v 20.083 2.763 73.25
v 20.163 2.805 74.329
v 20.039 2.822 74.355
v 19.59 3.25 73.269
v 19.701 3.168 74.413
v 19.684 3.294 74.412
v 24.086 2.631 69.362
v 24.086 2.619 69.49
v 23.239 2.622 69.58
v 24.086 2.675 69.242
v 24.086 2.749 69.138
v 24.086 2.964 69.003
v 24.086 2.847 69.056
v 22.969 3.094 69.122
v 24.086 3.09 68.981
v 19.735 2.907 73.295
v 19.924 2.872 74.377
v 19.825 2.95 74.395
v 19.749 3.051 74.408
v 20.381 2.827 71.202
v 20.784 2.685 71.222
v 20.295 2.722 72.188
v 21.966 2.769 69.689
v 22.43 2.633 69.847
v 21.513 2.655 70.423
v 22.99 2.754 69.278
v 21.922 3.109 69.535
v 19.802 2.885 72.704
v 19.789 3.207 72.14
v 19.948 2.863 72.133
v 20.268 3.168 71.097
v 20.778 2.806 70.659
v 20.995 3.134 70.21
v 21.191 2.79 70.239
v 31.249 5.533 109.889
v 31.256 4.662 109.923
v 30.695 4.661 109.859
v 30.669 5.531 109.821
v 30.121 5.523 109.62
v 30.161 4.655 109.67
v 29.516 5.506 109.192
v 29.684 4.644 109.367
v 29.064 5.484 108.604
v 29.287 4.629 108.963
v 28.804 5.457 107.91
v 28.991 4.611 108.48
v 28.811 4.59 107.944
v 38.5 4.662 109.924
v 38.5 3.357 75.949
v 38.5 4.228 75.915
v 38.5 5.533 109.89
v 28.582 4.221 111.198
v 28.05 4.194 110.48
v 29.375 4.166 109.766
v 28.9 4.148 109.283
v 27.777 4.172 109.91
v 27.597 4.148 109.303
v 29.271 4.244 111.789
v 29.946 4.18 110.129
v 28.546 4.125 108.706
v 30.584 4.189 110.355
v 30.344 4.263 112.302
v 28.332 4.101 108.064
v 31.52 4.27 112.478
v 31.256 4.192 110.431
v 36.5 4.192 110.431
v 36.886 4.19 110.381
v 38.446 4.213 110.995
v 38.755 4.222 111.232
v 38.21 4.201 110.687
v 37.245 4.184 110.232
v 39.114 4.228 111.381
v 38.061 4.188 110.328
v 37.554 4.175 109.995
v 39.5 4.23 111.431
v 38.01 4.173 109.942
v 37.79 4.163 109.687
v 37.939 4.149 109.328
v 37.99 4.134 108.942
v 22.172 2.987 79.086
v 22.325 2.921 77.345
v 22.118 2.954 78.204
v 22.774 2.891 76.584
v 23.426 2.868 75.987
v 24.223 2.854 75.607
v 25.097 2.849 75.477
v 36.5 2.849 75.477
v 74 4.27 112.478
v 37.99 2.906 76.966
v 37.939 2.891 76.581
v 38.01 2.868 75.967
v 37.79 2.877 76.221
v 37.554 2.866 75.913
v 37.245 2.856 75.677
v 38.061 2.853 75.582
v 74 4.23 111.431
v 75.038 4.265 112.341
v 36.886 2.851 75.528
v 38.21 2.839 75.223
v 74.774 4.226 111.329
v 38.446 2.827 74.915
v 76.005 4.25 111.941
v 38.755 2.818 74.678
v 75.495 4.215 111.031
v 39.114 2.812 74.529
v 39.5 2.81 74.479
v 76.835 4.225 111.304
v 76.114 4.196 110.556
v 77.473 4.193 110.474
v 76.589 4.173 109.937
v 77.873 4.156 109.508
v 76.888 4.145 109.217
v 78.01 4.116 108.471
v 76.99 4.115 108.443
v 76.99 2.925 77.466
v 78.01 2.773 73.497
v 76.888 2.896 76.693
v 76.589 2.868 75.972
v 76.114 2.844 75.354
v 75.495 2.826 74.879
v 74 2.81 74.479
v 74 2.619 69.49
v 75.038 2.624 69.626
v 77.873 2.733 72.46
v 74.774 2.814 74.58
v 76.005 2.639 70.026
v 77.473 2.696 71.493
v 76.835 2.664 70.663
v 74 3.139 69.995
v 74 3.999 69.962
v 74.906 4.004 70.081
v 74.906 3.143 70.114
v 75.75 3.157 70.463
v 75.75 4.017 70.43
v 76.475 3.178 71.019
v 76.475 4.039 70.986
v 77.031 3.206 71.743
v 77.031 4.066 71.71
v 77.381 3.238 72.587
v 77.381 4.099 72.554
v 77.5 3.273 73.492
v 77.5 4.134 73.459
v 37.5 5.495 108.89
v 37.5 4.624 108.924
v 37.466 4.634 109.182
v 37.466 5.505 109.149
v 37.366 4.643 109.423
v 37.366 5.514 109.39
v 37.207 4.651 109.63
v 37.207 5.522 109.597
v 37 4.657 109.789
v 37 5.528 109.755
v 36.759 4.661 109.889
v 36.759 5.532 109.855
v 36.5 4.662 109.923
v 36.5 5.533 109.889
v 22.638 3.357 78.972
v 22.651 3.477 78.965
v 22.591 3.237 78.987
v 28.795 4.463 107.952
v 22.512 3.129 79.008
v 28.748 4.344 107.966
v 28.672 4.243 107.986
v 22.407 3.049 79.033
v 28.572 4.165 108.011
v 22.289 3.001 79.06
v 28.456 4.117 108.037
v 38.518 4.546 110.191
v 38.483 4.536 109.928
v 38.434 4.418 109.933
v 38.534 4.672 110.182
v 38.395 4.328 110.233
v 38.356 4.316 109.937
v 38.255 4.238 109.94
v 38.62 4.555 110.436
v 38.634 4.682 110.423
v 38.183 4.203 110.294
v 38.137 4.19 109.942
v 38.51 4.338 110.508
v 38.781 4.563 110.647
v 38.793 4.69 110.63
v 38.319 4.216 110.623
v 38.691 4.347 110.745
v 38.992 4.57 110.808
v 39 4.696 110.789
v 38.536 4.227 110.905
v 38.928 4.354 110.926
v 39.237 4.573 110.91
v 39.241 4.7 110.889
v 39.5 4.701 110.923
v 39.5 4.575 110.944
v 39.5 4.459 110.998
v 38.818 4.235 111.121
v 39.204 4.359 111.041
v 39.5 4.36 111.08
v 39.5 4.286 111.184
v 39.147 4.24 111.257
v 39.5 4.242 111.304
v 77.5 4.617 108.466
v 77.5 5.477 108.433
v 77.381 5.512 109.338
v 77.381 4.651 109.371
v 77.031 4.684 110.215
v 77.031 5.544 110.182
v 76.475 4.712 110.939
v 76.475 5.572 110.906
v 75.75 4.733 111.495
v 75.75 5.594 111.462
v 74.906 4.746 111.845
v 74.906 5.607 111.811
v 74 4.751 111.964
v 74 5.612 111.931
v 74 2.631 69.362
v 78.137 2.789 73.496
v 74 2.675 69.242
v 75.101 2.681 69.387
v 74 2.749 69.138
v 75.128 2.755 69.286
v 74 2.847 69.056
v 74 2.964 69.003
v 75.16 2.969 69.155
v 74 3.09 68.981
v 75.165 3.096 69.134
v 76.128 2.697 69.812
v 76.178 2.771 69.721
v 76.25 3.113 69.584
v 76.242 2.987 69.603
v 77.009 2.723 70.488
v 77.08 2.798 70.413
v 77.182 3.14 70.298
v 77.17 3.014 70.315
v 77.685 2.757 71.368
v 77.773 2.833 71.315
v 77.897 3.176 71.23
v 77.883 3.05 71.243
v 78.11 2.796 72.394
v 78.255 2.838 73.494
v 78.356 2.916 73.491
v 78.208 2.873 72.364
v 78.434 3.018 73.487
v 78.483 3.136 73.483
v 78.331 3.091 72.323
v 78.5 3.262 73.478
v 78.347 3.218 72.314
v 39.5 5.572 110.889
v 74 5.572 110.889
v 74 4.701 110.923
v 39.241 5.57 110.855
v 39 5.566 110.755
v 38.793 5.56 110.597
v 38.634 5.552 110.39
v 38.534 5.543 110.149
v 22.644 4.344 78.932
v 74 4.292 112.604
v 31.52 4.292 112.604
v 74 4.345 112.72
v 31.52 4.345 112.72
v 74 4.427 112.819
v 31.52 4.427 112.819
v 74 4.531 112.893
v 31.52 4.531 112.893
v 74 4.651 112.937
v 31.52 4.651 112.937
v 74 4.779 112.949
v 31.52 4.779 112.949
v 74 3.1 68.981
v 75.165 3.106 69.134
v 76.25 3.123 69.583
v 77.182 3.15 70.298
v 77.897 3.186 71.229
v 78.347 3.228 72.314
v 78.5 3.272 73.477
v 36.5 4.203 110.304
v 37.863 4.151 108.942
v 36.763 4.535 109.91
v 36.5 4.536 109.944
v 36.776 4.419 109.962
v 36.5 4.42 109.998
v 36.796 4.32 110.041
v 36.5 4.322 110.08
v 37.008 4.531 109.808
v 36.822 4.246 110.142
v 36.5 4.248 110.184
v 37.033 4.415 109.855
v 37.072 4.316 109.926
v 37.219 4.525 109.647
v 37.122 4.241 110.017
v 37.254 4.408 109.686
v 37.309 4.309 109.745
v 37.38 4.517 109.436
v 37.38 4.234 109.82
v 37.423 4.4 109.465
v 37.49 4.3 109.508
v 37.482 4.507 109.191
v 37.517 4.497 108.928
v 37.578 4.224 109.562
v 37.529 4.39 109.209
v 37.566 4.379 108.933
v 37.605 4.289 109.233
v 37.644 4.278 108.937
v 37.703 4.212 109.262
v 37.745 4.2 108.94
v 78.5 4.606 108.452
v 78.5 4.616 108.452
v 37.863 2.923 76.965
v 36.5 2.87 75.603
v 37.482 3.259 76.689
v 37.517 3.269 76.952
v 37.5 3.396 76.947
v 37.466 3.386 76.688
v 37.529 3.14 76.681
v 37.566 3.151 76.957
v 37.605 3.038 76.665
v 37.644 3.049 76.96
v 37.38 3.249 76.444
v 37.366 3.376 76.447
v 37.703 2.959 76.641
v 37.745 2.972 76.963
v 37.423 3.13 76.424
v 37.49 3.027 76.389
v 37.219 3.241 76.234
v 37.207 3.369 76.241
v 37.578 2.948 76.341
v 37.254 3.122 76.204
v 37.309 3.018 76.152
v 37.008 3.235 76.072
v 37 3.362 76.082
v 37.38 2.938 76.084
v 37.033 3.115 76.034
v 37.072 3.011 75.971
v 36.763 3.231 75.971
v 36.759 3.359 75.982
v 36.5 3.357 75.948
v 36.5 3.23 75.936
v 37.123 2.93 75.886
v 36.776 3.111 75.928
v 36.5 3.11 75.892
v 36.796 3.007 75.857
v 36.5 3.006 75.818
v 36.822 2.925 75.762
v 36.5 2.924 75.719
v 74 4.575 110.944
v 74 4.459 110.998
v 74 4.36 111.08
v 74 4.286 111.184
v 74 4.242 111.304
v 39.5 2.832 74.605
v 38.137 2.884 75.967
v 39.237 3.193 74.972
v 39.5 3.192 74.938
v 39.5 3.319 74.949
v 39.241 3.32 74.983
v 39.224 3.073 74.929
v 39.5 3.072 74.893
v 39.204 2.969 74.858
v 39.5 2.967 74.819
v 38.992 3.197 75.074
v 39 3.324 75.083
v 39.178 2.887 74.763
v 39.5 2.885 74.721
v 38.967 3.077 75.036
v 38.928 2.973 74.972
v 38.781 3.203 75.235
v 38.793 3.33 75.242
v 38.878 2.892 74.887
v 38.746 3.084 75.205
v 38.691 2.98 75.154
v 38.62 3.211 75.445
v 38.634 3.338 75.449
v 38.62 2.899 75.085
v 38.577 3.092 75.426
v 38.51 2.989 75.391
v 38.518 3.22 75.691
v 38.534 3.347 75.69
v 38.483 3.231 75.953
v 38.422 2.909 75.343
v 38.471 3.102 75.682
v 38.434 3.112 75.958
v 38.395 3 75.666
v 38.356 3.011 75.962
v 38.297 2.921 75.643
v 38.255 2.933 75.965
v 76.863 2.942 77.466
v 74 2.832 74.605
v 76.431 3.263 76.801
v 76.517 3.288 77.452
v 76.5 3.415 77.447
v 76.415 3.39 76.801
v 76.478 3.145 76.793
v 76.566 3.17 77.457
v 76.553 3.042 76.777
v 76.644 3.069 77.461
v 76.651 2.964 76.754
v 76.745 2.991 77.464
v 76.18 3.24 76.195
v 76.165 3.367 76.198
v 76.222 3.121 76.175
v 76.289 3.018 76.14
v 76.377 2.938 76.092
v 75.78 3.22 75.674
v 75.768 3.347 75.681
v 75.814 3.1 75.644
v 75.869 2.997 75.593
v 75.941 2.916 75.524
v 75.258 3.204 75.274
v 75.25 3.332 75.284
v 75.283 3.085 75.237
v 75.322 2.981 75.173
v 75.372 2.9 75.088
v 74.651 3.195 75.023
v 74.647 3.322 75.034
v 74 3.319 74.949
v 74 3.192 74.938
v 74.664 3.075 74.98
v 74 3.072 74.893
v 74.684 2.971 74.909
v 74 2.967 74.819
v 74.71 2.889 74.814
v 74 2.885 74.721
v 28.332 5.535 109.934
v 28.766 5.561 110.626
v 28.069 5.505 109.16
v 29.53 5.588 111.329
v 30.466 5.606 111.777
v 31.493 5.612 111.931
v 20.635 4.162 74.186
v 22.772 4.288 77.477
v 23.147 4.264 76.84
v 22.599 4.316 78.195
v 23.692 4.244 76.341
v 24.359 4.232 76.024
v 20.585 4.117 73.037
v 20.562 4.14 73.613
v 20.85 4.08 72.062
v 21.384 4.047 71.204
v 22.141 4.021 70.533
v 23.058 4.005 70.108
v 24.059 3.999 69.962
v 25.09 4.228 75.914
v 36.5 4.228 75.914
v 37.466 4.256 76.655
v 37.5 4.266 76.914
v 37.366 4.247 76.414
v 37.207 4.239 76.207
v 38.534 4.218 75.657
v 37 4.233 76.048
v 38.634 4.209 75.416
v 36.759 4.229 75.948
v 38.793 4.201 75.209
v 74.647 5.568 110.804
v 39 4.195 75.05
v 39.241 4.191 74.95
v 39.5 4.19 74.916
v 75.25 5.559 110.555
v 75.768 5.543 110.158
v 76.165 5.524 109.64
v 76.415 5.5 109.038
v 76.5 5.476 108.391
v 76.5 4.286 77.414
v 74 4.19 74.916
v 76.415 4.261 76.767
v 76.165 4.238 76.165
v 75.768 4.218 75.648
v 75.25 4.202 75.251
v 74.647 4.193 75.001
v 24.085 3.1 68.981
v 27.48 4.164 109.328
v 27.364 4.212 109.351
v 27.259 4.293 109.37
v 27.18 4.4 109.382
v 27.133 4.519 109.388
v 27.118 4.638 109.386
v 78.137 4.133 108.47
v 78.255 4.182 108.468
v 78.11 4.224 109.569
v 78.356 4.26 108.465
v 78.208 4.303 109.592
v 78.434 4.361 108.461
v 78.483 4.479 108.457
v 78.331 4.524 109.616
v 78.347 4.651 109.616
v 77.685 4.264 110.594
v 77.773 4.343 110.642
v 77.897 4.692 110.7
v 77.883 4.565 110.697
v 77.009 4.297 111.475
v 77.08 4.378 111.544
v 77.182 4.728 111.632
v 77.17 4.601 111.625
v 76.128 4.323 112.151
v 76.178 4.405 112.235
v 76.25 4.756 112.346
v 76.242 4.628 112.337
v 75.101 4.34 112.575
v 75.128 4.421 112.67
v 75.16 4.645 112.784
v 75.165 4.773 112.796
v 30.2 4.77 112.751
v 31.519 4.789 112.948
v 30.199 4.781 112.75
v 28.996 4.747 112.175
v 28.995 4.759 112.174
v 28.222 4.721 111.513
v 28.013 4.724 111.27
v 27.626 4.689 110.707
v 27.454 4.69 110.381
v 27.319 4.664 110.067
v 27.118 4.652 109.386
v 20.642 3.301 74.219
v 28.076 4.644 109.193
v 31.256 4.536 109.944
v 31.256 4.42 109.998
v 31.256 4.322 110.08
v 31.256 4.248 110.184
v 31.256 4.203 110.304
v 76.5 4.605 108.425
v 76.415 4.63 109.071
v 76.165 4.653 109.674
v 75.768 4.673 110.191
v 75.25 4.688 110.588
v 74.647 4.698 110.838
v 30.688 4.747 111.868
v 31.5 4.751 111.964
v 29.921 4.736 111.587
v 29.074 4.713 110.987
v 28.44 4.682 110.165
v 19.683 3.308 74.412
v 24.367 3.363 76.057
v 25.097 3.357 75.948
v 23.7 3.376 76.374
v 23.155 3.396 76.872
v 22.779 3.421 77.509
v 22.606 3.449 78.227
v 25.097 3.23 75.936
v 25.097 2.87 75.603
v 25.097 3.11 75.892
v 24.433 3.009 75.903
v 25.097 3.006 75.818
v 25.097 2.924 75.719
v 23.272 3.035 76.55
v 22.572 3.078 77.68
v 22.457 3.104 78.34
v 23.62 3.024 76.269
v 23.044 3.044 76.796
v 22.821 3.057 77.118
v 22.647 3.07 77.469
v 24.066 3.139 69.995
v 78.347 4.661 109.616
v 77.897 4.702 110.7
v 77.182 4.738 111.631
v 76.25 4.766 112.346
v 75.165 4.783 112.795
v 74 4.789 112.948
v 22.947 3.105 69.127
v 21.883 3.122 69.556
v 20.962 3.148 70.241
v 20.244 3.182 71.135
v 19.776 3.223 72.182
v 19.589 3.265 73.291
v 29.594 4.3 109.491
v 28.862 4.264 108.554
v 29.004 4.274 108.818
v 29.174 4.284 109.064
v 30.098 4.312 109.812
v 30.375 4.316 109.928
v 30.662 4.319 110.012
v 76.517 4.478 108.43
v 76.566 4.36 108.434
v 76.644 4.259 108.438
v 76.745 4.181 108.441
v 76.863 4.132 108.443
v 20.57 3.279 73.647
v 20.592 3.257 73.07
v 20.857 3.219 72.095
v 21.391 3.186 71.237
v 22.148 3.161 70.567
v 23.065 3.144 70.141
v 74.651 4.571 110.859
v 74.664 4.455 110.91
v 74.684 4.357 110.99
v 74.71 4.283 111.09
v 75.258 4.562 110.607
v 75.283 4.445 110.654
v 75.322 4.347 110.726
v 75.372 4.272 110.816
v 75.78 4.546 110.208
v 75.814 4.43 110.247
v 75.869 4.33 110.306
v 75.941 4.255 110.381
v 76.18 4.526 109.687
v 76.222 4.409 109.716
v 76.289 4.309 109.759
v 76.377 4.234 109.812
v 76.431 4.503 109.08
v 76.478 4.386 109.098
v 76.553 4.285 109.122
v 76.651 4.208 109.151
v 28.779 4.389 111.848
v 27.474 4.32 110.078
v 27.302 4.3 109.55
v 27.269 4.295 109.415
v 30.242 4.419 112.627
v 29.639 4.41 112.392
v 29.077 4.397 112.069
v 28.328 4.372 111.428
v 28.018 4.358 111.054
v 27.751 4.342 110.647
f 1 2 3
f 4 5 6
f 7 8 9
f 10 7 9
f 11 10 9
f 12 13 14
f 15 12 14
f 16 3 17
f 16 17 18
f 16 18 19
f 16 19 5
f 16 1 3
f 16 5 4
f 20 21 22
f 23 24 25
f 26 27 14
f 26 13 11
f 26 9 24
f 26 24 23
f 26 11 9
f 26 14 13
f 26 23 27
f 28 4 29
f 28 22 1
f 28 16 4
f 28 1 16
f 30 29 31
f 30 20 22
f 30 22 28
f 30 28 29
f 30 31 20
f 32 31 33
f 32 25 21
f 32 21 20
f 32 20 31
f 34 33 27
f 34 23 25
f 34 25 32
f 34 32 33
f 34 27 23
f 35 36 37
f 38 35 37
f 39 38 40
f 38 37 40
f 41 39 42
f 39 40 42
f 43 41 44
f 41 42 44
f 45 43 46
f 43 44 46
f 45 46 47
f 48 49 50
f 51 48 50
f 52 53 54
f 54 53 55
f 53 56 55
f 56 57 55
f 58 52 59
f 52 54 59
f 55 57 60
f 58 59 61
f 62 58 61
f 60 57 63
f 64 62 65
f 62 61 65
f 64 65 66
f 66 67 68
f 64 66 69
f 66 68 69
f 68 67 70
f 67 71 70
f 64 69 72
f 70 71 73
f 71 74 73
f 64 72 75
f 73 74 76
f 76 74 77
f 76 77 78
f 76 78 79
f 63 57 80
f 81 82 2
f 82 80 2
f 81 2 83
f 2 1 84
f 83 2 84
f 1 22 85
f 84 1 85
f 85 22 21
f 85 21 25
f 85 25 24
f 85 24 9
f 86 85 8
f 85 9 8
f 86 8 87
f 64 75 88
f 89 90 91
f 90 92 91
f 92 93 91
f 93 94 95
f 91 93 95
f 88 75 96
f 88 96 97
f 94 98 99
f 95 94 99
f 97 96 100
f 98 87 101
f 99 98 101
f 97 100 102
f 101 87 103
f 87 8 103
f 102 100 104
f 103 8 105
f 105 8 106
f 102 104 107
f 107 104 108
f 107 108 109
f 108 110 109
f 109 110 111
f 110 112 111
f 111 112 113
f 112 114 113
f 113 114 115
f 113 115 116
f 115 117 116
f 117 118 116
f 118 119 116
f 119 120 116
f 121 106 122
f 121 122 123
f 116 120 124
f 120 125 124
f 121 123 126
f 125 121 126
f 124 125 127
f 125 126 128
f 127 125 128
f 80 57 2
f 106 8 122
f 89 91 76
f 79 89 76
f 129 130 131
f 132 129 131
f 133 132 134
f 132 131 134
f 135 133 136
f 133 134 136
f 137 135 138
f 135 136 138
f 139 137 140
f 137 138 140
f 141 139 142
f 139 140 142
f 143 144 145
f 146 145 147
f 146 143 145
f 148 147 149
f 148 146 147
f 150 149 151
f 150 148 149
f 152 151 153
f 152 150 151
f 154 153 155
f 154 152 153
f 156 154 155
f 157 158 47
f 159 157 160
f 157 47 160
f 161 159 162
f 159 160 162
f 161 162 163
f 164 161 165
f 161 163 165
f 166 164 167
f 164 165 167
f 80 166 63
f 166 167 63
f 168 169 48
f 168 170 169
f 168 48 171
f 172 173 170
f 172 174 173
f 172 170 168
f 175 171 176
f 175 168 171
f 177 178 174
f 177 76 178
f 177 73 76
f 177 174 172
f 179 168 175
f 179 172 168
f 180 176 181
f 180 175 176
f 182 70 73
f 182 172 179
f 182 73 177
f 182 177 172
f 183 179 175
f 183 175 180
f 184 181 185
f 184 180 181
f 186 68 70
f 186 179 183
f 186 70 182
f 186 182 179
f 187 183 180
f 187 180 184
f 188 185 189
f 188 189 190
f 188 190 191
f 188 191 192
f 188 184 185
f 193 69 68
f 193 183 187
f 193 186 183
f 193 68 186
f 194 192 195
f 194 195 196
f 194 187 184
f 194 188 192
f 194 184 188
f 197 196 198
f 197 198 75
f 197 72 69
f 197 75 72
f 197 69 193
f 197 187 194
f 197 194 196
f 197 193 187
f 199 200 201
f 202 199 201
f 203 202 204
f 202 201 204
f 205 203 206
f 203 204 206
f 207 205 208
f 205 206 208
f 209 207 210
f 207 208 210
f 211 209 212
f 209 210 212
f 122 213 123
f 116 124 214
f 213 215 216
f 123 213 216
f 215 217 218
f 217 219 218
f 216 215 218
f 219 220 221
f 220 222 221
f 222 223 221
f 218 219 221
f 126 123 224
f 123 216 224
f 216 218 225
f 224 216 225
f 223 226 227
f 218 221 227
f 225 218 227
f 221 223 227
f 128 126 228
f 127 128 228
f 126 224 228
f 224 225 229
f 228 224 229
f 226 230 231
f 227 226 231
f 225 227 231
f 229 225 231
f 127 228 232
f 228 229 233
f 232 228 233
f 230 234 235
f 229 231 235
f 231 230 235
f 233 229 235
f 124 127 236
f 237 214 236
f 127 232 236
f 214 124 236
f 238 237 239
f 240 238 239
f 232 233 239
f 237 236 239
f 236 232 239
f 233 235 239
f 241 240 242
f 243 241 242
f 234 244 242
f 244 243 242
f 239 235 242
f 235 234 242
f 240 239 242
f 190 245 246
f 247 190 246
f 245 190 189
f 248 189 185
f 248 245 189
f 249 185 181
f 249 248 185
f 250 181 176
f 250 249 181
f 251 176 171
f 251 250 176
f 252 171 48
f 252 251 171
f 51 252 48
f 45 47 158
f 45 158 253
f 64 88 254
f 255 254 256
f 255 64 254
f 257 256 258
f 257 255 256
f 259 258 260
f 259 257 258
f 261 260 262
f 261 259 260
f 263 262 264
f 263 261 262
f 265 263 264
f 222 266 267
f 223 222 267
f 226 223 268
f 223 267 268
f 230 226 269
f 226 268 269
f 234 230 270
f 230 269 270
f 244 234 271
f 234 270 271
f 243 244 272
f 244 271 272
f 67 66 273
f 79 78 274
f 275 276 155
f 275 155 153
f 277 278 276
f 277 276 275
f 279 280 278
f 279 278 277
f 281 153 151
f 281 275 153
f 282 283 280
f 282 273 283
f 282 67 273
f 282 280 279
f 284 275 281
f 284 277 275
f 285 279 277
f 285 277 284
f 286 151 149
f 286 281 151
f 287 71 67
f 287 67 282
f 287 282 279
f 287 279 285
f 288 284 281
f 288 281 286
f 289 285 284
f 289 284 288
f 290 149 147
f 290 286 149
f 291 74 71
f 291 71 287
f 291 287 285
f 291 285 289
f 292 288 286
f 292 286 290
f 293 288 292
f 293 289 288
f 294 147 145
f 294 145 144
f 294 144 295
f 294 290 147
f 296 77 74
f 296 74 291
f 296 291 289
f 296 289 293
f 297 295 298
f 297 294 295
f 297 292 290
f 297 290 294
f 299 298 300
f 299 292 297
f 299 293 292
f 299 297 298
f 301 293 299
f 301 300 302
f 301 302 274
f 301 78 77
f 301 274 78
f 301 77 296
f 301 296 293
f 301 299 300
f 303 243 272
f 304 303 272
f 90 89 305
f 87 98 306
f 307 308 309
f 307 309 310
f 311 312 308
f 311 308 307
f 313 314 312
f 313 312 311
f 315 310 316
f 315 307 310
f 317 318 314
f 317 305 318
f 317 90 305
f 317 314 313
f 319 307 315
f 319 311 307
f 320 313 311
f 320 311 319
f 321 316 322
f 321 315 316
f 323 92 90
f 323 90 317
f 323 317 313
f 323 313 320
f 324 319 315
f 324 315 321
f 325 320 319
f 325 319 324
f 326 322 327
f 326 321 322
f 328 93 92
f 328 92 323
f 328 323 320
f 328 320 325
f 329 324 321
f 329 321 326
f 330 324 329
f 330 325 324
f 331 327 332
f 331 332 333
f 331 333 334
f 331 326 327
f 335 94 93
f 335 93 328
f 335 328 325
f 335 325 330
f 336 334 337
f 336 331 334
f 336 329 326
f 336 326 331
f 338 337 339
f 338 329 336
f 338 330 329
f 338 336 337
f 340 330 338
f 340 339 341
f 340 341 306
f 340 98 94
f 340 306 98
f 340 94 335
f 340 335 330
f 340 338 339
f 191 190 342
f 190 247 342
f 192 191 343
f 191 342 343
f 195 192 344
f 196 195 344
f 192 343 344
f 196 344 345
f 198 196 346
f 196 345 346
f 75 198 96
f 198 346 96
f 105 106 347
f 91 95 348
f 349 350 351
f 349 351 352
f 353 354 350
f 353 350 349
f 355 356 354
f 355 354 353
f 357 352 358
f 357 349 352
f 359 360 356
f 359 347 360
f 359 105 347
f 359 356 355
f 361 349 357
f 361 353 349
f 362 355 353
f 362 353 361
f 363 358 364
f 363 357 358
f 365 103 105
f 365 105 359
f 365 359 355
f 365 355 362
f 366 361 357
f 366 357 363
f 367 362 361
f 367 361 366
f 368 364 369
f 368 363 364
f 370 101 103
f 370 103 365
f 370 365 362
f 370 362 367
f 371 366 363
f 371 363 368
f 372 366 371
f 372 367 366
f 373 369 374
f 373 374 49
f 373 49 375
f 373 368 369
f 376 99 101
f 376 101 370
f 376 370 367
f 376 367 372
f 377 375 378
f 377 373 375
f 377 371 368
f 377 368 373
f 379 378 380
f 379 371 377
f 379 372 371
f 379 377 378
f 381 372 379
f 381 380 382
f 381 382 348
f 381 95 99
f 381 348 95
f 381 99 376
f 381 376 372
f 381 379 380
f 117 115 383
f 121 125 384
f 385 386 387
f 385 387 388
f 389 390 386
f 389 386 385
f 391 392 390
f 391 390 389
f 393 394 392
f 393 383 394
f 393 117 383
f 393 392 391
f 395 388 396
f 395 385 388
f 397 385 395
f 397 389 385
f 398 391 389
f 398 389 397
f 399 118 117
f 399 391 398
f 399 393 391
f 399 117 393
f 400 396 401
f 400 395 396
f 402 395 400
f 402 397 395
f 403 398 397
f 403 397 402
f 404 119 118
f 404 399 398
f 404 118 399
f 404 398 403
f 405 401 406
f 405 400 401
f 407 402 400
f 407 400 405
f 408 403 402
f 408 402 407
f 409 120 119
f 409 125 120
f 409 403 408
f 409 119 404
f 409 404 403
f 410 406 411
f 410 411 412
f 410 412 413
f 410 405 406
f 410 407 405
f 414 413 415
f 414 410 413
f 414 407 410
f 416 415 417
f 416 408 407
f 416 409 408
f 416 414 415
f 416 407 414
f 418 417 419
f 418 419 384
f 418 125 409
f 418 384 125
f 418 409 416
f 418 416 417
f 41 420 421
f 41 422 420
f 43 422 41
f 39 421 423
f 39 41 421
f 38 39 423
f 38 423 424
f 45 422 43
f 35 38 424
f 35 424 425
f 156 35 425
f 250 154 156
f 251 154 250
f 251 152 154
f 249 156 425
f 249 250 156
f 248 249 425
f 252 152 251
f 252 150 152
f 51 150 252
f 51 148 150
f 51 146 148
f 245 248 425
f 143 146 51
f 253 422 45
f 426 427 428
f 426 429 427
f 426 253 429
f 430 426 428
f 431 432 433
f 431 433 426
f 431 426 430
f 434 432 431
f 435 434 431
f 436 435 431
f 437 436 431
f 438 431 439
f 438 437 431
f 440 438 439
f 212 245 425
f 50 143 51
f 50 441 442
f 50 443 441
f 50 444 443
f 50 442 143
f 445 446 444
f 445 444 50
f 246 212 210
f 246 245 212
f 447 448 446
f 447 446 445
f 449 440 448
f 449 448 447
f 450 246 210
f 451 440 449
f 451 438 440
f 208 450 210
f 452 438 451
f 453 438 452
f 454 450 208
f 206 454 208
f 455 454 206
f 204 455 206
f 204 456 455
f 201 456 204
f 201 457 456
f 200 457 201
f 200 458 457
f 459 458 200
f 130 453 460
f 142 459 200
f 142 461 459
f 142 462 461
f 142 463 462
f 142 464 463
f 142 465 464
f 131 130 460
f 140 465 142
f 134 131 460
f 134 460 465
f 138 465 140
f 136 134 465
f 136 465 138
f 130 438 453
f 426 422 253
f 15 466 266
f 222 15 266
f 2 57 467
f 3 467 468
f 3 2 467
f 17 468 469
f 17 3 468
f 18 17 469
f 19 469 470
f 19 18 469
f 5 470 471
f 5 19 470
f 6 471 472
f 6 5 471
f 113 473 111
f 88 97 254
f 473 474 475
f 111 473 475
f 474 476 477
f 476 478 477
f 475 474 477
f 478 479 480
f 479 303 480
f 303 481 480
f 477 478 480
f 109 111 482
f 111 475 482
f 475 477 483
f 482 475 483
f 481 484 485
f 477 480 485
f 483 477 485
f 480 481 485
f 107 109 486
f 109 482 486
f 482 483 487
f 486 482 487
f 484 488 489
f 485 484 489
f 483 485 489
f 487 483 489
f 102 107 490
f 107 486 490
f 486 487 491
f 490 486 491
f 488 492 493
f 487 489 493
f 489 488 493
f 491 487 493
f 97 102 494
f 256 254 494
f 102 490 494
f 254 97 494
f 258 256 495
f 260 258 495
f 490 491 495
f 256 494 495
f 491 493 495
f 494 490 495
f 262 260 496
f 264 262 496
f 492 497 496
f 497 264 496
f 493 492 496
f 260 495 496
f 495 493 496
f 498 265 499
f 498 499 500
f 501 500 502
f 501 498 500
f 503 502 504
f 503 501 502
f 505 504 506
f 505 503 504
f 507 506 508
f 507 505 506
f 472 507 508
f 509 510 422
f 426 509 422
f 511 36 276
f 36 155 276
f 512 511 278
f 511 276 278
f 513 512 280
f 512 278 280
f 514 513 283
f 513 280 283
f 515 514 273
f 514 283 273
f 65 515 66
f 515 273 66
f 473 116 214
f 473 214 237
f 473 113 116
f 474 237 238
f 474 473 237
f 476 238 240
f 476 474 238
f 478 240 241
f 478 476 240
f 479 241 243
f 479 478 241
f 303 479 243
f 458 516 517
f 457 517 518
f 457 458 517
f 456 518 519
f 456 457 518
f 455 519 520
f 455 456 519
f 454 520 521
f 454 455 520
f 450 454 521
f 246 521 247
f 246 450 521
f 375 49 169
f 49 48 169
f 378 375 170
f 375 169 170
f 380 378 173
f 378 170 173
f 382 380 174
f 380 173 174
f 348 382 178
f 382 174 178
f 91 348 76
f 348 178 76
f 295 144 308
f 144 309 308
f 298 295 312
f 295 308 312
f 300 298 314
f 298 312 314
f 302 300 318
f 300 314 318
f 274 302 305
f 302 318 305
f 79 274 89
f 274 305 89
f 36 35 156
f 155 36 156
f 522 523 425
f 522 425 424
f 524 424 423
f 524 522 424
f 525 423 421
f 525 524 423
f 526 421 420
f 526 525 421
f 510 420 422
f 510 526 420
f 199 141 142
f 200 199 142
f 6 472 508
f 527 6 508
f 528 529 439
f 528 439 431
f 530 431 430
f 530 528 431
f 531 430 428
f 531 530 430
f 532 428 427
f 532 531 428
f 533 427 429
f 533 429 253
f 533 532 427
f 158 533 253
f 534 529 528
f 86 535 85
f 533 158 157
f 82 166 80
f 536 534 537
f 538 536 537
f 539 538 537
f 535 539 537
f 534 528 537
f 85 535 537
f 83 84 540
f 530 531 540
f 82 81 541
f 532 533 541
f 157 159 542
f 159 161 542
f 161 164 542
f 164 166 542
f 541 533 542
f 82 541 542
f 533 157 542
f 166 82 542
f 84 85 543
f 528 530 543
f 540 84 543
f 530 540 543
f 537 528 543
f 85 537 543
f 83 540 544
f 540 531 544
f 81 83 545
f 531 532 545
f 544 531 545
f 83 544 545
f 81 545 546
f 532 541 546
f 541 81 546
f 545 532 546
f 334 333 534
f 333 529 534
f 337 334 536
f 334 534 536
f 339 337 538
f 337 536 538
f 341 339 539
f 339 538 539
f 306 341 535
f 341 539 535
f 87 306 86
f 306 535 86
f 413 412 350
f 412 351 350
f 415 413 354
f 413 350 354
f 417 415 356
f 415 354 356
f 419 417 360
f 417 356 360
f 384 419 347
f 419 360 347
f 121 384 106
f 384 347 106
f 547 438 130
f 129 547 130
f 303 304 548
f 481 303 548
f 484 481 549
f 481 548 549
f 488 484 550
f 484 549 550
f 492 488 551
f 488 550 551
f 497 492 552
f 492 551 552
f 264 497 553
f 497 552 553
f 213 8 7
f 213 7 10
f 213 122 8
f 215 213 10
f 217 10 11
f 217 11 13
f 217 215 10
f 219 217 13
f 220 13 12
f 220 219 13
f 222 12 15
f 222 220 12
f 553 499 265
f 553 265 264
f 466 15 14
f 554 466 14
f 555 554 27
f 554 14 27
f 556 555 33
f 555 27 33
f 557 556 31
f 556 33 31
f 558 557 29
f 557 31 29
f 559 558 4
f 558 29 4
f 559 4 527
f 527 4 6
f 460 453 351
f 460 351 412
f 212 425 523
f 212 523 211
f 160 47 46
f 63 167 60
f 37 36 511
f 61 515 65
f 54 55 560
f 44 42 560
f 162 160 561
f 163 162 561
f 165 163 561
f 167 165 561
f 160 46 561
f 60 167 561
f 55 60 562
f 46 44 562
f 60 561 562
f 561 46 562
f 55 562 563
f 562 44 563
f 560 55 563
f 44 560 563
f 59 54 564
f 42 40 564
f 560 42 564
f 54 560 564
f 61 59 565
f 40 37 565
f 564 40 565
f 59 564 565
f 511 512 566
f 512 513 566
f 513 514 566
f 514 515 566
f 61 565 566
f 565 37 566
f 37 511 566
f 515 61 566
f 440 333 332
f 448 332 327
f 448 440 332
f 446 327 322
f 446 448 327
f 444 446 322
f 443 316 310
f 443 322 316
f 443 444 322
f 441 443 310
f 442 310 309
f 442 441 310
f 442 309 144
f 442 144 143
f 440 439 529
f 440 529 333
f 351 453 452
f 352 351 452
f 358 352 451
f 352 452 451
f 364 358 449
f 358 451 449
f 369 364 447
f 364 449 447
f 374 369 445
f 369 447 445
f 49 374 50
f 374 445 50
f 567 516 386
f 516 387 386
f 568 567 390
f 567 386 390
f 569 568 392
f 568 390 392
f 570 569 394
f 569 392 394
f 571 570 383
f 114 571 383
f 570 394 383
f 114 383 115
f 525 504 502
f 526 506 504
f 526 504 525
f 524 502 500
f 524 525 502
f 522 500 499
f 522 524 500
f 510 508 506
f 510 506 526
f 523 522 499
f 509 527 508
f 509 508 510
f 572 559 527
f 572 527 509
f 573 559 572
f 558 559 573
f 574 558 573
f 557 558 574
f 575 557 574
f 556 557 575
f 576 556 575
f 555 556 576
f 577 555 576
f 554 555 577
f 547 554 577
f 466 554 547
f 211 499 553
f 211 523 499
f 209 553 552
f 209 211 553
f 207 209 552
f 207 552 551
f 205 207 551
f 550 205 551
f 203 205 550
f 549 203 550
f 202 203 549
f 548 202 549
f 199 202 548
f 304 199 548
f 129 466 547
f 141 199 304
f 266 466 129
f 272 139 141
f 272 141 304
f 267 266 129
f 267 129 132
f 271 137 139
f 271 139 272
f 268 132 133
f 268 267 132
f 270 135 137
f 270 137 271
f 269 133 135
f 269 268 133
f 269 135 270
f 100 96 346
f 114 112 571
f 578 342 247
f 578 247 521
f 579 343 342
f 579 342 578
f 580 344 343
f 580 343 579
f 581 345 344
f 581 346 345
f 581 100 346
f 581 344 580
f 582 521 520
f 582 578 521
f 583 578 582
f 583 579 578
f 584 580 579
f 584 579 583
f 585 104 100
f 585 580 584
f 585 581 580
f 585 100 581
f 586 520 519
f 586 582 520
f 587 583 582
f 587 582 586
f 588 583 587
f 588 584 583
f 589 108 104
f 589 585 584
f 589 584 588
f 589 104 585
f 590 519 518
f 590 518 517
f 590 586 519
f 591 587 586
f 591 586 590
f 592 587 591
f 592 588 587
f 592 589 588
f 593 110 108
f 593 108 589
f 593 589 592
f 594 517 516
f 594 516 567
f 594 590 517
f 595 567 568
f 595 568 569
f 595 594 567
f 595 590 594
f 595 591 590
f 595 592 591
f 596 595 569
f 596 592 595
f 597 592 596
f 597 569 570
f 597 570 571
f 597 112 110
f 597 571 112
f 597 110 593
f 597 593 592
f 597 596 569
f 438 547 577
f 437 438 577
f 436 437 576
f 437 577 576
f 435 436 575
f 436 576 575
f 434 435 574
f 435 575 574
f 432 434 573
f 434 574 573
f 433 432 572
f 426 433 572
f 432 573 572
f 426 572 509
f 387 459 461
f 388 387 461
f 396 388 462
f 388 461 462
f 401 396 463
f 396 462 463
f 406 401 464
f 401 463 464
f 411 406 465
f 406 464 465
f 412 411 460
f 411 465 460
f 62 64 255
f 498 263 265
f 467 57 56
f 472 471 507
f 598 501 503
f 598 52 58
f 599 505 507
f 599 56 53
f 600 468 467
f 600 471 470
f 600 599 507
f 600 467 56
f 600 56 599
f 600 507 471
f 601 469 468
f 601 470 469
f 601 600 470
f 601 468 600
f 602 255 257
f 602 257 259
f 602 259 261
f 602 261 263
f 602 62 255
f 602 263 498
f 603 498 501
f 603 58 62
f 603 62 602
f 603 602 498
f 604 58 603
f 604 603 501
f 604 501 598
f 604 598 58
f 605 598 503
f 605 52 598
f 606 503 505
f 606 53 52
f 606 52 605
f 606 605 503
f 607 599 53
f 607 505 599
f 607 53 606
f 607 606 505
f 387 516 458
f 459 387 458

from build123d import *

# Parameters (mm, degrees)
BOX024_W               = 11
BOX024_H               = 7
BOX024_DEPTH           = 48
BOX024_ROLL_ANGLE      = -2.200006
BOX024_PITCH_ANGLE     = 12.000025
BOX024_PLACEMENT_ANGLE = -1e-06
BOX023_W               = 17
BOX023_H               = 5
BOX023_DEPTH           = 34
BOX023_ROLL_ANGLE      = -2.2
FILLET024_R            = 2.5
FILLET025_R            = 1
BOX025_W               = 38
BOX025_H               = 5
BOX025_DEPTH           = 36
BOX025_ROLL_ANGLE      = -2.2
FILLET022_R            = 2.5
FILLET023_R            = 1
BOX003_W               = 11
BOX003_H               = 7
BOX003_DEPTH           = 48
BOX003_ROLL_ANGLE      = -2.200006
BOX003_PITCH_ANGLE     = 12.000025
BOX003_PLACEMENT_ANGLE = -1e-06
BOX002_W               = 58
BOX002_H               = 1
BOX002_DEPTH           = 42
BOX002_ROLL_ANGLE      = -2.2
FILLET021_R            = 3.5
BOX022_W               = 11
BOX022_H               = 7
BOX022_DEPTH           = 48
BOX022_ROLL_ANGLE      = -2.200006
BOX022_PITCH_ANGLE     = 12.000025
BOX022_PLACEMENT_ANGLE = -1e-06
BOX021_W               = 60
BOX021_H               = 0.5
BOX021_DEPTH           = 44
BOX021_ROLL_ANGLE      = -2.2
FILLET020_R            = 4.5
FILLET026_R            = 0.49
FILLET027_R            = 0.49


with BuildPart() as cube450:
    # Box024 → Box024 (new body)
    with BuildSketch(Plane.XY):
        with Locations((5.5, 3.5)):
            Rectangle(BOX024_W, BOX024_H)
    extrude(amount=BOX024_DEPTH)


with BuildPart() as cube450_1:
    # Box024 roll: moved
    add(cube450.part.rotate(Axis((0, 0, 0), (1, 0, 0)), BOX024_ROLL_ANGLE))


with BuildPart() as cube450_2:
    # Box024 pitch: moved
    add(cube450_1.part.rotate(Axis((0, 0, 0), (0, 1, 0)), BOX024_PITCH_ANGLE))


with BuildPart() as cube450_3:
    # Box024 placement: moved
    add(cube450_2.part.moved(Location((9.5, 1, 70))).rotate(Axis((9.5, 1, 70), (0, 0, 1)), BOX024_PLACEMENT_ANGLE))


with BuildPart() as fillet025:
    # Box023 → Box023 (new body)
    with BuildSketch(Plane.XY):
        with Locations((8.5, 2.5)):
            Rectangle(BOX023_W, BOX023_H)
    extrude(amount=BOX023_DEPTH)


with BuildPart() as fillet025_1:
    # Box023 roll: moved
    add(fillet025.part.rotate(Axis((0, 0, 0), (1, 0, 0)), BOX023_ROLL_ANGLE))


with BuildPart() as fillet025_2:
    # Box023 placement: moved
    add(fillet025_1.part.moved(Location((20.5, 2, 76))))

    # Cut016: cut Cube450
    add(cube450_3.part, mode=Mode.SUBTRACT)

    # Fillet024
    fillet024_edges = [fillet025_2.edges().sort_by_distance(p)[0] for p in [
        (22.000691, 4.498157, 75.90403),
        (29.222302, 5.803343, 109.87897),
    ]]
    fillet(fillet024_edges, radius=FILLET024_R)

    # Fillet025
    fillet025_edges = [fillet025_2.edges().sort_by_distance(p)[0] for p in [
        (37.5, 4.498157, 75.90403),
        (37.5, 5.803343, 109.87897),
    ]]
    fillet(fillet025_edges, radius=FILLET025_R)


with BuildPart() as fusion002:
    # Box025 → Box025 (new body)
    with BuildSketch(Plane.XY):
        with Locations((19, 2.5)):
            Rectangle(BOX025_W, BOX025_H)
    extrude(amount=BOX025_DEPTH)


with BuildPart() as fusion002_1:
    # Box025 roll: moved
    add(fusion002.part.rotate(Axis((0, 0, 0), (1, 0, 0)), BOX025_ROLL_ANGLE))


with BuildPart() as fusion002_2:
    # Box025 placement: moved
    add(fusion002_1.part.moved(Location((38.5, 2, 75))))

    # Fillet022
    fillet022_edges = [fusion002_2.edges().sort_by_distance(p)[0] for p in [
        (76.5, 5.880118, 110.877495),
        (76.5, 4.498157, 74.90403),
    ]]
    fillet(fillet022_edges, radius=FILLET022_R)

    # Fillet023
    fillet023_edges = [fusion002_2.edges().sort_by_distance(p)[0] for p in [
        (38.5, 4.498157, 74.90403),
        (38.5, 5.880118, 110.877495),
    ]]
    fillet(fillet023_edges, radius=FILLET023_R)

    # Fusion002: union Fillet025
    add(fillet025_2.part)


with BuildPart() as cube049:
    # Box003 → Box003 (new body)
    with BuildSketch(Plane.XY):
        with Locations((5.5, 3.5)):
            Rectangle(BOX003_W, BOX003_H)
    extrude(amount=BOX003_DEPTH)


with BuildPart() as cube049_1:
    # Box003 roll: moved
    add(cube049.part.rotate(Axis((0, 0, 0), (1, 0, 0)), BOX003_ROLL_ANGLE))


with BuildPart() as cube049_2:
    # Box003 pitch: moved
    add(cube049_1.part.rotate(Axis((0, 0, 0), (0, 1, 0)), BOX003_PITCH_ANGLE))


with BuildPart() as cube049_3:
    # Box003 placement: moved
    add(cube049_2.part.moved(Location((8.5, 1, 70))).rotate(Axis((8.5, 1, 70), (0, 0, 1)), BOX003_PLACEMENT_ANGLE))


with BuildPart() as fillet021:
    # Box002 → Box002 (new body)
    with BuildSketch(Plane.XY):
        with Locations((29, 0.5)):
            Rectangle(BOX002_W, BOX002_H)
    extrude(amount=BOX002_DEPTH)


with BuildPart() as fillet021_1:
    # Box002 roll: moved
    add(fillet021.part.rotate(Axis((0, 0, 0), (1, 0, 0)), BOX002_ROLL_ANGLE))


with BuildPart() as fillet021_2:
    # Box002 placement: moved
    add(fillet021_1.part.moved(Location((19.5, 3, 70))))

    # Cut001: cut Cube049
    add(cube049_3.part, mode=Mode.SUBTRACT)

    # Fillet021
    fillet021_edges = [fillet021_2.edges().sort_by_distance(p)[0] for p in [
        (77.5, 3.499631, 69.980806),
        (19.741668, 3.499631, 69.980806),
        (77.5, 5.111919, 111.949849),
        (28.662482, 5.111919, 111.949849),
    ]]
    fillet(fillet021_edges, radius=FILLET021_R)


with BuildPart() as cube448:
    # Box022 → Box022 (new body)
    with BuildSketch(Plane.XY):
        with Locations((5.5, 3.5)):
            Rectangle(BOX022_W, BOX022_H)
    extrude(amount=BOX022_DEPTH)


with BuildPart() as cube448_1:
    # Box022 roll: moved
    add(cube448.part.rotate(Axis((0, 0, 0), (1, 0, 0)), BOX022_ROLL_ANGLE))


with BuildPart() as cube448_2:
    # Box022 pitch: moved
    add(cube448_1.part.rotate(Axis((0, 0, 0), (0, 1, 0)), BOX022_PITCH_ANGLE))


with BuildPart() as cube448_3:
    # Box022 placement: moved
    add(cube448_2.part.moved(Location((7.5, 1, 70))).rotate(Axis((7.5, 1, 70), (0, 0, 1)), BOX022_PLACEMENT_ANGLE))


with BuildPart() as left_front_window_border:
    # Box021 → Box021 (new body)
    with BuildSketch(Plane.XY):
        with Locations((30, 0.25)):
            Rectangle(BOX021_W, BOX021_H)
    extrude(amount=BOX021_DEPTH)


with BuildPart() as left_front_window_border_1:
    # Box021 roll: moved
    add(left_front_window_border.part.rotate(Axis((0, 0, 0), (1, 0, 0)), BOX021_ROLL_ANGLE))


with BuildPart() as left_front_window_border_2:
    # Box021 placement: moved
    add(left_front_window_border_1.part.moved(Location((18.5, 2.6, 69))))

    # Cut015: cut Cube448
    add(cube448_3.part, mode=Mode.SUBTRACT)

    # Fillet020
    fillet020_edges = [left_front_window_border_2.edges().sort_by_distance(p)[0] for p in [
        (78.5, 2.849816, 68.990403),
        (18.531151, 2.849816, 68.990403),
        (78.5, 4.538879, 112.957971),
        (27.876766, 4.538879, 112.957971),
    ]]
    fillet(fillet020_edges, radius=FILLET020_R)

    # Fusion: union Fillet021
    add(fillet021_2.part)

    # Cut017: cut Fusion002
    add(fusion002_2.part, mode=Mode.SUBTRACT)

    # Fillet026
    fillet026_edges = [left_front_window_border_2.edges().sort_by_distance(p)[0] for p in [
        (33.880234, 4.172818, 109.941608),
        (56.75, 4.211234, 110.941608),
    ]]
    fillet(fillet026_edges, radius=FILLET026_R)

    # Fillet027
    fillet027_edges = [left_front_window_border_2.edges().sort_by_distance(p)[0] for p in [
        (49.044763, 2.6, 69),
    ]]
    fillet(fillet027_edges, radius=FILLET027_R)


solid = left_front_window_border_2.part
